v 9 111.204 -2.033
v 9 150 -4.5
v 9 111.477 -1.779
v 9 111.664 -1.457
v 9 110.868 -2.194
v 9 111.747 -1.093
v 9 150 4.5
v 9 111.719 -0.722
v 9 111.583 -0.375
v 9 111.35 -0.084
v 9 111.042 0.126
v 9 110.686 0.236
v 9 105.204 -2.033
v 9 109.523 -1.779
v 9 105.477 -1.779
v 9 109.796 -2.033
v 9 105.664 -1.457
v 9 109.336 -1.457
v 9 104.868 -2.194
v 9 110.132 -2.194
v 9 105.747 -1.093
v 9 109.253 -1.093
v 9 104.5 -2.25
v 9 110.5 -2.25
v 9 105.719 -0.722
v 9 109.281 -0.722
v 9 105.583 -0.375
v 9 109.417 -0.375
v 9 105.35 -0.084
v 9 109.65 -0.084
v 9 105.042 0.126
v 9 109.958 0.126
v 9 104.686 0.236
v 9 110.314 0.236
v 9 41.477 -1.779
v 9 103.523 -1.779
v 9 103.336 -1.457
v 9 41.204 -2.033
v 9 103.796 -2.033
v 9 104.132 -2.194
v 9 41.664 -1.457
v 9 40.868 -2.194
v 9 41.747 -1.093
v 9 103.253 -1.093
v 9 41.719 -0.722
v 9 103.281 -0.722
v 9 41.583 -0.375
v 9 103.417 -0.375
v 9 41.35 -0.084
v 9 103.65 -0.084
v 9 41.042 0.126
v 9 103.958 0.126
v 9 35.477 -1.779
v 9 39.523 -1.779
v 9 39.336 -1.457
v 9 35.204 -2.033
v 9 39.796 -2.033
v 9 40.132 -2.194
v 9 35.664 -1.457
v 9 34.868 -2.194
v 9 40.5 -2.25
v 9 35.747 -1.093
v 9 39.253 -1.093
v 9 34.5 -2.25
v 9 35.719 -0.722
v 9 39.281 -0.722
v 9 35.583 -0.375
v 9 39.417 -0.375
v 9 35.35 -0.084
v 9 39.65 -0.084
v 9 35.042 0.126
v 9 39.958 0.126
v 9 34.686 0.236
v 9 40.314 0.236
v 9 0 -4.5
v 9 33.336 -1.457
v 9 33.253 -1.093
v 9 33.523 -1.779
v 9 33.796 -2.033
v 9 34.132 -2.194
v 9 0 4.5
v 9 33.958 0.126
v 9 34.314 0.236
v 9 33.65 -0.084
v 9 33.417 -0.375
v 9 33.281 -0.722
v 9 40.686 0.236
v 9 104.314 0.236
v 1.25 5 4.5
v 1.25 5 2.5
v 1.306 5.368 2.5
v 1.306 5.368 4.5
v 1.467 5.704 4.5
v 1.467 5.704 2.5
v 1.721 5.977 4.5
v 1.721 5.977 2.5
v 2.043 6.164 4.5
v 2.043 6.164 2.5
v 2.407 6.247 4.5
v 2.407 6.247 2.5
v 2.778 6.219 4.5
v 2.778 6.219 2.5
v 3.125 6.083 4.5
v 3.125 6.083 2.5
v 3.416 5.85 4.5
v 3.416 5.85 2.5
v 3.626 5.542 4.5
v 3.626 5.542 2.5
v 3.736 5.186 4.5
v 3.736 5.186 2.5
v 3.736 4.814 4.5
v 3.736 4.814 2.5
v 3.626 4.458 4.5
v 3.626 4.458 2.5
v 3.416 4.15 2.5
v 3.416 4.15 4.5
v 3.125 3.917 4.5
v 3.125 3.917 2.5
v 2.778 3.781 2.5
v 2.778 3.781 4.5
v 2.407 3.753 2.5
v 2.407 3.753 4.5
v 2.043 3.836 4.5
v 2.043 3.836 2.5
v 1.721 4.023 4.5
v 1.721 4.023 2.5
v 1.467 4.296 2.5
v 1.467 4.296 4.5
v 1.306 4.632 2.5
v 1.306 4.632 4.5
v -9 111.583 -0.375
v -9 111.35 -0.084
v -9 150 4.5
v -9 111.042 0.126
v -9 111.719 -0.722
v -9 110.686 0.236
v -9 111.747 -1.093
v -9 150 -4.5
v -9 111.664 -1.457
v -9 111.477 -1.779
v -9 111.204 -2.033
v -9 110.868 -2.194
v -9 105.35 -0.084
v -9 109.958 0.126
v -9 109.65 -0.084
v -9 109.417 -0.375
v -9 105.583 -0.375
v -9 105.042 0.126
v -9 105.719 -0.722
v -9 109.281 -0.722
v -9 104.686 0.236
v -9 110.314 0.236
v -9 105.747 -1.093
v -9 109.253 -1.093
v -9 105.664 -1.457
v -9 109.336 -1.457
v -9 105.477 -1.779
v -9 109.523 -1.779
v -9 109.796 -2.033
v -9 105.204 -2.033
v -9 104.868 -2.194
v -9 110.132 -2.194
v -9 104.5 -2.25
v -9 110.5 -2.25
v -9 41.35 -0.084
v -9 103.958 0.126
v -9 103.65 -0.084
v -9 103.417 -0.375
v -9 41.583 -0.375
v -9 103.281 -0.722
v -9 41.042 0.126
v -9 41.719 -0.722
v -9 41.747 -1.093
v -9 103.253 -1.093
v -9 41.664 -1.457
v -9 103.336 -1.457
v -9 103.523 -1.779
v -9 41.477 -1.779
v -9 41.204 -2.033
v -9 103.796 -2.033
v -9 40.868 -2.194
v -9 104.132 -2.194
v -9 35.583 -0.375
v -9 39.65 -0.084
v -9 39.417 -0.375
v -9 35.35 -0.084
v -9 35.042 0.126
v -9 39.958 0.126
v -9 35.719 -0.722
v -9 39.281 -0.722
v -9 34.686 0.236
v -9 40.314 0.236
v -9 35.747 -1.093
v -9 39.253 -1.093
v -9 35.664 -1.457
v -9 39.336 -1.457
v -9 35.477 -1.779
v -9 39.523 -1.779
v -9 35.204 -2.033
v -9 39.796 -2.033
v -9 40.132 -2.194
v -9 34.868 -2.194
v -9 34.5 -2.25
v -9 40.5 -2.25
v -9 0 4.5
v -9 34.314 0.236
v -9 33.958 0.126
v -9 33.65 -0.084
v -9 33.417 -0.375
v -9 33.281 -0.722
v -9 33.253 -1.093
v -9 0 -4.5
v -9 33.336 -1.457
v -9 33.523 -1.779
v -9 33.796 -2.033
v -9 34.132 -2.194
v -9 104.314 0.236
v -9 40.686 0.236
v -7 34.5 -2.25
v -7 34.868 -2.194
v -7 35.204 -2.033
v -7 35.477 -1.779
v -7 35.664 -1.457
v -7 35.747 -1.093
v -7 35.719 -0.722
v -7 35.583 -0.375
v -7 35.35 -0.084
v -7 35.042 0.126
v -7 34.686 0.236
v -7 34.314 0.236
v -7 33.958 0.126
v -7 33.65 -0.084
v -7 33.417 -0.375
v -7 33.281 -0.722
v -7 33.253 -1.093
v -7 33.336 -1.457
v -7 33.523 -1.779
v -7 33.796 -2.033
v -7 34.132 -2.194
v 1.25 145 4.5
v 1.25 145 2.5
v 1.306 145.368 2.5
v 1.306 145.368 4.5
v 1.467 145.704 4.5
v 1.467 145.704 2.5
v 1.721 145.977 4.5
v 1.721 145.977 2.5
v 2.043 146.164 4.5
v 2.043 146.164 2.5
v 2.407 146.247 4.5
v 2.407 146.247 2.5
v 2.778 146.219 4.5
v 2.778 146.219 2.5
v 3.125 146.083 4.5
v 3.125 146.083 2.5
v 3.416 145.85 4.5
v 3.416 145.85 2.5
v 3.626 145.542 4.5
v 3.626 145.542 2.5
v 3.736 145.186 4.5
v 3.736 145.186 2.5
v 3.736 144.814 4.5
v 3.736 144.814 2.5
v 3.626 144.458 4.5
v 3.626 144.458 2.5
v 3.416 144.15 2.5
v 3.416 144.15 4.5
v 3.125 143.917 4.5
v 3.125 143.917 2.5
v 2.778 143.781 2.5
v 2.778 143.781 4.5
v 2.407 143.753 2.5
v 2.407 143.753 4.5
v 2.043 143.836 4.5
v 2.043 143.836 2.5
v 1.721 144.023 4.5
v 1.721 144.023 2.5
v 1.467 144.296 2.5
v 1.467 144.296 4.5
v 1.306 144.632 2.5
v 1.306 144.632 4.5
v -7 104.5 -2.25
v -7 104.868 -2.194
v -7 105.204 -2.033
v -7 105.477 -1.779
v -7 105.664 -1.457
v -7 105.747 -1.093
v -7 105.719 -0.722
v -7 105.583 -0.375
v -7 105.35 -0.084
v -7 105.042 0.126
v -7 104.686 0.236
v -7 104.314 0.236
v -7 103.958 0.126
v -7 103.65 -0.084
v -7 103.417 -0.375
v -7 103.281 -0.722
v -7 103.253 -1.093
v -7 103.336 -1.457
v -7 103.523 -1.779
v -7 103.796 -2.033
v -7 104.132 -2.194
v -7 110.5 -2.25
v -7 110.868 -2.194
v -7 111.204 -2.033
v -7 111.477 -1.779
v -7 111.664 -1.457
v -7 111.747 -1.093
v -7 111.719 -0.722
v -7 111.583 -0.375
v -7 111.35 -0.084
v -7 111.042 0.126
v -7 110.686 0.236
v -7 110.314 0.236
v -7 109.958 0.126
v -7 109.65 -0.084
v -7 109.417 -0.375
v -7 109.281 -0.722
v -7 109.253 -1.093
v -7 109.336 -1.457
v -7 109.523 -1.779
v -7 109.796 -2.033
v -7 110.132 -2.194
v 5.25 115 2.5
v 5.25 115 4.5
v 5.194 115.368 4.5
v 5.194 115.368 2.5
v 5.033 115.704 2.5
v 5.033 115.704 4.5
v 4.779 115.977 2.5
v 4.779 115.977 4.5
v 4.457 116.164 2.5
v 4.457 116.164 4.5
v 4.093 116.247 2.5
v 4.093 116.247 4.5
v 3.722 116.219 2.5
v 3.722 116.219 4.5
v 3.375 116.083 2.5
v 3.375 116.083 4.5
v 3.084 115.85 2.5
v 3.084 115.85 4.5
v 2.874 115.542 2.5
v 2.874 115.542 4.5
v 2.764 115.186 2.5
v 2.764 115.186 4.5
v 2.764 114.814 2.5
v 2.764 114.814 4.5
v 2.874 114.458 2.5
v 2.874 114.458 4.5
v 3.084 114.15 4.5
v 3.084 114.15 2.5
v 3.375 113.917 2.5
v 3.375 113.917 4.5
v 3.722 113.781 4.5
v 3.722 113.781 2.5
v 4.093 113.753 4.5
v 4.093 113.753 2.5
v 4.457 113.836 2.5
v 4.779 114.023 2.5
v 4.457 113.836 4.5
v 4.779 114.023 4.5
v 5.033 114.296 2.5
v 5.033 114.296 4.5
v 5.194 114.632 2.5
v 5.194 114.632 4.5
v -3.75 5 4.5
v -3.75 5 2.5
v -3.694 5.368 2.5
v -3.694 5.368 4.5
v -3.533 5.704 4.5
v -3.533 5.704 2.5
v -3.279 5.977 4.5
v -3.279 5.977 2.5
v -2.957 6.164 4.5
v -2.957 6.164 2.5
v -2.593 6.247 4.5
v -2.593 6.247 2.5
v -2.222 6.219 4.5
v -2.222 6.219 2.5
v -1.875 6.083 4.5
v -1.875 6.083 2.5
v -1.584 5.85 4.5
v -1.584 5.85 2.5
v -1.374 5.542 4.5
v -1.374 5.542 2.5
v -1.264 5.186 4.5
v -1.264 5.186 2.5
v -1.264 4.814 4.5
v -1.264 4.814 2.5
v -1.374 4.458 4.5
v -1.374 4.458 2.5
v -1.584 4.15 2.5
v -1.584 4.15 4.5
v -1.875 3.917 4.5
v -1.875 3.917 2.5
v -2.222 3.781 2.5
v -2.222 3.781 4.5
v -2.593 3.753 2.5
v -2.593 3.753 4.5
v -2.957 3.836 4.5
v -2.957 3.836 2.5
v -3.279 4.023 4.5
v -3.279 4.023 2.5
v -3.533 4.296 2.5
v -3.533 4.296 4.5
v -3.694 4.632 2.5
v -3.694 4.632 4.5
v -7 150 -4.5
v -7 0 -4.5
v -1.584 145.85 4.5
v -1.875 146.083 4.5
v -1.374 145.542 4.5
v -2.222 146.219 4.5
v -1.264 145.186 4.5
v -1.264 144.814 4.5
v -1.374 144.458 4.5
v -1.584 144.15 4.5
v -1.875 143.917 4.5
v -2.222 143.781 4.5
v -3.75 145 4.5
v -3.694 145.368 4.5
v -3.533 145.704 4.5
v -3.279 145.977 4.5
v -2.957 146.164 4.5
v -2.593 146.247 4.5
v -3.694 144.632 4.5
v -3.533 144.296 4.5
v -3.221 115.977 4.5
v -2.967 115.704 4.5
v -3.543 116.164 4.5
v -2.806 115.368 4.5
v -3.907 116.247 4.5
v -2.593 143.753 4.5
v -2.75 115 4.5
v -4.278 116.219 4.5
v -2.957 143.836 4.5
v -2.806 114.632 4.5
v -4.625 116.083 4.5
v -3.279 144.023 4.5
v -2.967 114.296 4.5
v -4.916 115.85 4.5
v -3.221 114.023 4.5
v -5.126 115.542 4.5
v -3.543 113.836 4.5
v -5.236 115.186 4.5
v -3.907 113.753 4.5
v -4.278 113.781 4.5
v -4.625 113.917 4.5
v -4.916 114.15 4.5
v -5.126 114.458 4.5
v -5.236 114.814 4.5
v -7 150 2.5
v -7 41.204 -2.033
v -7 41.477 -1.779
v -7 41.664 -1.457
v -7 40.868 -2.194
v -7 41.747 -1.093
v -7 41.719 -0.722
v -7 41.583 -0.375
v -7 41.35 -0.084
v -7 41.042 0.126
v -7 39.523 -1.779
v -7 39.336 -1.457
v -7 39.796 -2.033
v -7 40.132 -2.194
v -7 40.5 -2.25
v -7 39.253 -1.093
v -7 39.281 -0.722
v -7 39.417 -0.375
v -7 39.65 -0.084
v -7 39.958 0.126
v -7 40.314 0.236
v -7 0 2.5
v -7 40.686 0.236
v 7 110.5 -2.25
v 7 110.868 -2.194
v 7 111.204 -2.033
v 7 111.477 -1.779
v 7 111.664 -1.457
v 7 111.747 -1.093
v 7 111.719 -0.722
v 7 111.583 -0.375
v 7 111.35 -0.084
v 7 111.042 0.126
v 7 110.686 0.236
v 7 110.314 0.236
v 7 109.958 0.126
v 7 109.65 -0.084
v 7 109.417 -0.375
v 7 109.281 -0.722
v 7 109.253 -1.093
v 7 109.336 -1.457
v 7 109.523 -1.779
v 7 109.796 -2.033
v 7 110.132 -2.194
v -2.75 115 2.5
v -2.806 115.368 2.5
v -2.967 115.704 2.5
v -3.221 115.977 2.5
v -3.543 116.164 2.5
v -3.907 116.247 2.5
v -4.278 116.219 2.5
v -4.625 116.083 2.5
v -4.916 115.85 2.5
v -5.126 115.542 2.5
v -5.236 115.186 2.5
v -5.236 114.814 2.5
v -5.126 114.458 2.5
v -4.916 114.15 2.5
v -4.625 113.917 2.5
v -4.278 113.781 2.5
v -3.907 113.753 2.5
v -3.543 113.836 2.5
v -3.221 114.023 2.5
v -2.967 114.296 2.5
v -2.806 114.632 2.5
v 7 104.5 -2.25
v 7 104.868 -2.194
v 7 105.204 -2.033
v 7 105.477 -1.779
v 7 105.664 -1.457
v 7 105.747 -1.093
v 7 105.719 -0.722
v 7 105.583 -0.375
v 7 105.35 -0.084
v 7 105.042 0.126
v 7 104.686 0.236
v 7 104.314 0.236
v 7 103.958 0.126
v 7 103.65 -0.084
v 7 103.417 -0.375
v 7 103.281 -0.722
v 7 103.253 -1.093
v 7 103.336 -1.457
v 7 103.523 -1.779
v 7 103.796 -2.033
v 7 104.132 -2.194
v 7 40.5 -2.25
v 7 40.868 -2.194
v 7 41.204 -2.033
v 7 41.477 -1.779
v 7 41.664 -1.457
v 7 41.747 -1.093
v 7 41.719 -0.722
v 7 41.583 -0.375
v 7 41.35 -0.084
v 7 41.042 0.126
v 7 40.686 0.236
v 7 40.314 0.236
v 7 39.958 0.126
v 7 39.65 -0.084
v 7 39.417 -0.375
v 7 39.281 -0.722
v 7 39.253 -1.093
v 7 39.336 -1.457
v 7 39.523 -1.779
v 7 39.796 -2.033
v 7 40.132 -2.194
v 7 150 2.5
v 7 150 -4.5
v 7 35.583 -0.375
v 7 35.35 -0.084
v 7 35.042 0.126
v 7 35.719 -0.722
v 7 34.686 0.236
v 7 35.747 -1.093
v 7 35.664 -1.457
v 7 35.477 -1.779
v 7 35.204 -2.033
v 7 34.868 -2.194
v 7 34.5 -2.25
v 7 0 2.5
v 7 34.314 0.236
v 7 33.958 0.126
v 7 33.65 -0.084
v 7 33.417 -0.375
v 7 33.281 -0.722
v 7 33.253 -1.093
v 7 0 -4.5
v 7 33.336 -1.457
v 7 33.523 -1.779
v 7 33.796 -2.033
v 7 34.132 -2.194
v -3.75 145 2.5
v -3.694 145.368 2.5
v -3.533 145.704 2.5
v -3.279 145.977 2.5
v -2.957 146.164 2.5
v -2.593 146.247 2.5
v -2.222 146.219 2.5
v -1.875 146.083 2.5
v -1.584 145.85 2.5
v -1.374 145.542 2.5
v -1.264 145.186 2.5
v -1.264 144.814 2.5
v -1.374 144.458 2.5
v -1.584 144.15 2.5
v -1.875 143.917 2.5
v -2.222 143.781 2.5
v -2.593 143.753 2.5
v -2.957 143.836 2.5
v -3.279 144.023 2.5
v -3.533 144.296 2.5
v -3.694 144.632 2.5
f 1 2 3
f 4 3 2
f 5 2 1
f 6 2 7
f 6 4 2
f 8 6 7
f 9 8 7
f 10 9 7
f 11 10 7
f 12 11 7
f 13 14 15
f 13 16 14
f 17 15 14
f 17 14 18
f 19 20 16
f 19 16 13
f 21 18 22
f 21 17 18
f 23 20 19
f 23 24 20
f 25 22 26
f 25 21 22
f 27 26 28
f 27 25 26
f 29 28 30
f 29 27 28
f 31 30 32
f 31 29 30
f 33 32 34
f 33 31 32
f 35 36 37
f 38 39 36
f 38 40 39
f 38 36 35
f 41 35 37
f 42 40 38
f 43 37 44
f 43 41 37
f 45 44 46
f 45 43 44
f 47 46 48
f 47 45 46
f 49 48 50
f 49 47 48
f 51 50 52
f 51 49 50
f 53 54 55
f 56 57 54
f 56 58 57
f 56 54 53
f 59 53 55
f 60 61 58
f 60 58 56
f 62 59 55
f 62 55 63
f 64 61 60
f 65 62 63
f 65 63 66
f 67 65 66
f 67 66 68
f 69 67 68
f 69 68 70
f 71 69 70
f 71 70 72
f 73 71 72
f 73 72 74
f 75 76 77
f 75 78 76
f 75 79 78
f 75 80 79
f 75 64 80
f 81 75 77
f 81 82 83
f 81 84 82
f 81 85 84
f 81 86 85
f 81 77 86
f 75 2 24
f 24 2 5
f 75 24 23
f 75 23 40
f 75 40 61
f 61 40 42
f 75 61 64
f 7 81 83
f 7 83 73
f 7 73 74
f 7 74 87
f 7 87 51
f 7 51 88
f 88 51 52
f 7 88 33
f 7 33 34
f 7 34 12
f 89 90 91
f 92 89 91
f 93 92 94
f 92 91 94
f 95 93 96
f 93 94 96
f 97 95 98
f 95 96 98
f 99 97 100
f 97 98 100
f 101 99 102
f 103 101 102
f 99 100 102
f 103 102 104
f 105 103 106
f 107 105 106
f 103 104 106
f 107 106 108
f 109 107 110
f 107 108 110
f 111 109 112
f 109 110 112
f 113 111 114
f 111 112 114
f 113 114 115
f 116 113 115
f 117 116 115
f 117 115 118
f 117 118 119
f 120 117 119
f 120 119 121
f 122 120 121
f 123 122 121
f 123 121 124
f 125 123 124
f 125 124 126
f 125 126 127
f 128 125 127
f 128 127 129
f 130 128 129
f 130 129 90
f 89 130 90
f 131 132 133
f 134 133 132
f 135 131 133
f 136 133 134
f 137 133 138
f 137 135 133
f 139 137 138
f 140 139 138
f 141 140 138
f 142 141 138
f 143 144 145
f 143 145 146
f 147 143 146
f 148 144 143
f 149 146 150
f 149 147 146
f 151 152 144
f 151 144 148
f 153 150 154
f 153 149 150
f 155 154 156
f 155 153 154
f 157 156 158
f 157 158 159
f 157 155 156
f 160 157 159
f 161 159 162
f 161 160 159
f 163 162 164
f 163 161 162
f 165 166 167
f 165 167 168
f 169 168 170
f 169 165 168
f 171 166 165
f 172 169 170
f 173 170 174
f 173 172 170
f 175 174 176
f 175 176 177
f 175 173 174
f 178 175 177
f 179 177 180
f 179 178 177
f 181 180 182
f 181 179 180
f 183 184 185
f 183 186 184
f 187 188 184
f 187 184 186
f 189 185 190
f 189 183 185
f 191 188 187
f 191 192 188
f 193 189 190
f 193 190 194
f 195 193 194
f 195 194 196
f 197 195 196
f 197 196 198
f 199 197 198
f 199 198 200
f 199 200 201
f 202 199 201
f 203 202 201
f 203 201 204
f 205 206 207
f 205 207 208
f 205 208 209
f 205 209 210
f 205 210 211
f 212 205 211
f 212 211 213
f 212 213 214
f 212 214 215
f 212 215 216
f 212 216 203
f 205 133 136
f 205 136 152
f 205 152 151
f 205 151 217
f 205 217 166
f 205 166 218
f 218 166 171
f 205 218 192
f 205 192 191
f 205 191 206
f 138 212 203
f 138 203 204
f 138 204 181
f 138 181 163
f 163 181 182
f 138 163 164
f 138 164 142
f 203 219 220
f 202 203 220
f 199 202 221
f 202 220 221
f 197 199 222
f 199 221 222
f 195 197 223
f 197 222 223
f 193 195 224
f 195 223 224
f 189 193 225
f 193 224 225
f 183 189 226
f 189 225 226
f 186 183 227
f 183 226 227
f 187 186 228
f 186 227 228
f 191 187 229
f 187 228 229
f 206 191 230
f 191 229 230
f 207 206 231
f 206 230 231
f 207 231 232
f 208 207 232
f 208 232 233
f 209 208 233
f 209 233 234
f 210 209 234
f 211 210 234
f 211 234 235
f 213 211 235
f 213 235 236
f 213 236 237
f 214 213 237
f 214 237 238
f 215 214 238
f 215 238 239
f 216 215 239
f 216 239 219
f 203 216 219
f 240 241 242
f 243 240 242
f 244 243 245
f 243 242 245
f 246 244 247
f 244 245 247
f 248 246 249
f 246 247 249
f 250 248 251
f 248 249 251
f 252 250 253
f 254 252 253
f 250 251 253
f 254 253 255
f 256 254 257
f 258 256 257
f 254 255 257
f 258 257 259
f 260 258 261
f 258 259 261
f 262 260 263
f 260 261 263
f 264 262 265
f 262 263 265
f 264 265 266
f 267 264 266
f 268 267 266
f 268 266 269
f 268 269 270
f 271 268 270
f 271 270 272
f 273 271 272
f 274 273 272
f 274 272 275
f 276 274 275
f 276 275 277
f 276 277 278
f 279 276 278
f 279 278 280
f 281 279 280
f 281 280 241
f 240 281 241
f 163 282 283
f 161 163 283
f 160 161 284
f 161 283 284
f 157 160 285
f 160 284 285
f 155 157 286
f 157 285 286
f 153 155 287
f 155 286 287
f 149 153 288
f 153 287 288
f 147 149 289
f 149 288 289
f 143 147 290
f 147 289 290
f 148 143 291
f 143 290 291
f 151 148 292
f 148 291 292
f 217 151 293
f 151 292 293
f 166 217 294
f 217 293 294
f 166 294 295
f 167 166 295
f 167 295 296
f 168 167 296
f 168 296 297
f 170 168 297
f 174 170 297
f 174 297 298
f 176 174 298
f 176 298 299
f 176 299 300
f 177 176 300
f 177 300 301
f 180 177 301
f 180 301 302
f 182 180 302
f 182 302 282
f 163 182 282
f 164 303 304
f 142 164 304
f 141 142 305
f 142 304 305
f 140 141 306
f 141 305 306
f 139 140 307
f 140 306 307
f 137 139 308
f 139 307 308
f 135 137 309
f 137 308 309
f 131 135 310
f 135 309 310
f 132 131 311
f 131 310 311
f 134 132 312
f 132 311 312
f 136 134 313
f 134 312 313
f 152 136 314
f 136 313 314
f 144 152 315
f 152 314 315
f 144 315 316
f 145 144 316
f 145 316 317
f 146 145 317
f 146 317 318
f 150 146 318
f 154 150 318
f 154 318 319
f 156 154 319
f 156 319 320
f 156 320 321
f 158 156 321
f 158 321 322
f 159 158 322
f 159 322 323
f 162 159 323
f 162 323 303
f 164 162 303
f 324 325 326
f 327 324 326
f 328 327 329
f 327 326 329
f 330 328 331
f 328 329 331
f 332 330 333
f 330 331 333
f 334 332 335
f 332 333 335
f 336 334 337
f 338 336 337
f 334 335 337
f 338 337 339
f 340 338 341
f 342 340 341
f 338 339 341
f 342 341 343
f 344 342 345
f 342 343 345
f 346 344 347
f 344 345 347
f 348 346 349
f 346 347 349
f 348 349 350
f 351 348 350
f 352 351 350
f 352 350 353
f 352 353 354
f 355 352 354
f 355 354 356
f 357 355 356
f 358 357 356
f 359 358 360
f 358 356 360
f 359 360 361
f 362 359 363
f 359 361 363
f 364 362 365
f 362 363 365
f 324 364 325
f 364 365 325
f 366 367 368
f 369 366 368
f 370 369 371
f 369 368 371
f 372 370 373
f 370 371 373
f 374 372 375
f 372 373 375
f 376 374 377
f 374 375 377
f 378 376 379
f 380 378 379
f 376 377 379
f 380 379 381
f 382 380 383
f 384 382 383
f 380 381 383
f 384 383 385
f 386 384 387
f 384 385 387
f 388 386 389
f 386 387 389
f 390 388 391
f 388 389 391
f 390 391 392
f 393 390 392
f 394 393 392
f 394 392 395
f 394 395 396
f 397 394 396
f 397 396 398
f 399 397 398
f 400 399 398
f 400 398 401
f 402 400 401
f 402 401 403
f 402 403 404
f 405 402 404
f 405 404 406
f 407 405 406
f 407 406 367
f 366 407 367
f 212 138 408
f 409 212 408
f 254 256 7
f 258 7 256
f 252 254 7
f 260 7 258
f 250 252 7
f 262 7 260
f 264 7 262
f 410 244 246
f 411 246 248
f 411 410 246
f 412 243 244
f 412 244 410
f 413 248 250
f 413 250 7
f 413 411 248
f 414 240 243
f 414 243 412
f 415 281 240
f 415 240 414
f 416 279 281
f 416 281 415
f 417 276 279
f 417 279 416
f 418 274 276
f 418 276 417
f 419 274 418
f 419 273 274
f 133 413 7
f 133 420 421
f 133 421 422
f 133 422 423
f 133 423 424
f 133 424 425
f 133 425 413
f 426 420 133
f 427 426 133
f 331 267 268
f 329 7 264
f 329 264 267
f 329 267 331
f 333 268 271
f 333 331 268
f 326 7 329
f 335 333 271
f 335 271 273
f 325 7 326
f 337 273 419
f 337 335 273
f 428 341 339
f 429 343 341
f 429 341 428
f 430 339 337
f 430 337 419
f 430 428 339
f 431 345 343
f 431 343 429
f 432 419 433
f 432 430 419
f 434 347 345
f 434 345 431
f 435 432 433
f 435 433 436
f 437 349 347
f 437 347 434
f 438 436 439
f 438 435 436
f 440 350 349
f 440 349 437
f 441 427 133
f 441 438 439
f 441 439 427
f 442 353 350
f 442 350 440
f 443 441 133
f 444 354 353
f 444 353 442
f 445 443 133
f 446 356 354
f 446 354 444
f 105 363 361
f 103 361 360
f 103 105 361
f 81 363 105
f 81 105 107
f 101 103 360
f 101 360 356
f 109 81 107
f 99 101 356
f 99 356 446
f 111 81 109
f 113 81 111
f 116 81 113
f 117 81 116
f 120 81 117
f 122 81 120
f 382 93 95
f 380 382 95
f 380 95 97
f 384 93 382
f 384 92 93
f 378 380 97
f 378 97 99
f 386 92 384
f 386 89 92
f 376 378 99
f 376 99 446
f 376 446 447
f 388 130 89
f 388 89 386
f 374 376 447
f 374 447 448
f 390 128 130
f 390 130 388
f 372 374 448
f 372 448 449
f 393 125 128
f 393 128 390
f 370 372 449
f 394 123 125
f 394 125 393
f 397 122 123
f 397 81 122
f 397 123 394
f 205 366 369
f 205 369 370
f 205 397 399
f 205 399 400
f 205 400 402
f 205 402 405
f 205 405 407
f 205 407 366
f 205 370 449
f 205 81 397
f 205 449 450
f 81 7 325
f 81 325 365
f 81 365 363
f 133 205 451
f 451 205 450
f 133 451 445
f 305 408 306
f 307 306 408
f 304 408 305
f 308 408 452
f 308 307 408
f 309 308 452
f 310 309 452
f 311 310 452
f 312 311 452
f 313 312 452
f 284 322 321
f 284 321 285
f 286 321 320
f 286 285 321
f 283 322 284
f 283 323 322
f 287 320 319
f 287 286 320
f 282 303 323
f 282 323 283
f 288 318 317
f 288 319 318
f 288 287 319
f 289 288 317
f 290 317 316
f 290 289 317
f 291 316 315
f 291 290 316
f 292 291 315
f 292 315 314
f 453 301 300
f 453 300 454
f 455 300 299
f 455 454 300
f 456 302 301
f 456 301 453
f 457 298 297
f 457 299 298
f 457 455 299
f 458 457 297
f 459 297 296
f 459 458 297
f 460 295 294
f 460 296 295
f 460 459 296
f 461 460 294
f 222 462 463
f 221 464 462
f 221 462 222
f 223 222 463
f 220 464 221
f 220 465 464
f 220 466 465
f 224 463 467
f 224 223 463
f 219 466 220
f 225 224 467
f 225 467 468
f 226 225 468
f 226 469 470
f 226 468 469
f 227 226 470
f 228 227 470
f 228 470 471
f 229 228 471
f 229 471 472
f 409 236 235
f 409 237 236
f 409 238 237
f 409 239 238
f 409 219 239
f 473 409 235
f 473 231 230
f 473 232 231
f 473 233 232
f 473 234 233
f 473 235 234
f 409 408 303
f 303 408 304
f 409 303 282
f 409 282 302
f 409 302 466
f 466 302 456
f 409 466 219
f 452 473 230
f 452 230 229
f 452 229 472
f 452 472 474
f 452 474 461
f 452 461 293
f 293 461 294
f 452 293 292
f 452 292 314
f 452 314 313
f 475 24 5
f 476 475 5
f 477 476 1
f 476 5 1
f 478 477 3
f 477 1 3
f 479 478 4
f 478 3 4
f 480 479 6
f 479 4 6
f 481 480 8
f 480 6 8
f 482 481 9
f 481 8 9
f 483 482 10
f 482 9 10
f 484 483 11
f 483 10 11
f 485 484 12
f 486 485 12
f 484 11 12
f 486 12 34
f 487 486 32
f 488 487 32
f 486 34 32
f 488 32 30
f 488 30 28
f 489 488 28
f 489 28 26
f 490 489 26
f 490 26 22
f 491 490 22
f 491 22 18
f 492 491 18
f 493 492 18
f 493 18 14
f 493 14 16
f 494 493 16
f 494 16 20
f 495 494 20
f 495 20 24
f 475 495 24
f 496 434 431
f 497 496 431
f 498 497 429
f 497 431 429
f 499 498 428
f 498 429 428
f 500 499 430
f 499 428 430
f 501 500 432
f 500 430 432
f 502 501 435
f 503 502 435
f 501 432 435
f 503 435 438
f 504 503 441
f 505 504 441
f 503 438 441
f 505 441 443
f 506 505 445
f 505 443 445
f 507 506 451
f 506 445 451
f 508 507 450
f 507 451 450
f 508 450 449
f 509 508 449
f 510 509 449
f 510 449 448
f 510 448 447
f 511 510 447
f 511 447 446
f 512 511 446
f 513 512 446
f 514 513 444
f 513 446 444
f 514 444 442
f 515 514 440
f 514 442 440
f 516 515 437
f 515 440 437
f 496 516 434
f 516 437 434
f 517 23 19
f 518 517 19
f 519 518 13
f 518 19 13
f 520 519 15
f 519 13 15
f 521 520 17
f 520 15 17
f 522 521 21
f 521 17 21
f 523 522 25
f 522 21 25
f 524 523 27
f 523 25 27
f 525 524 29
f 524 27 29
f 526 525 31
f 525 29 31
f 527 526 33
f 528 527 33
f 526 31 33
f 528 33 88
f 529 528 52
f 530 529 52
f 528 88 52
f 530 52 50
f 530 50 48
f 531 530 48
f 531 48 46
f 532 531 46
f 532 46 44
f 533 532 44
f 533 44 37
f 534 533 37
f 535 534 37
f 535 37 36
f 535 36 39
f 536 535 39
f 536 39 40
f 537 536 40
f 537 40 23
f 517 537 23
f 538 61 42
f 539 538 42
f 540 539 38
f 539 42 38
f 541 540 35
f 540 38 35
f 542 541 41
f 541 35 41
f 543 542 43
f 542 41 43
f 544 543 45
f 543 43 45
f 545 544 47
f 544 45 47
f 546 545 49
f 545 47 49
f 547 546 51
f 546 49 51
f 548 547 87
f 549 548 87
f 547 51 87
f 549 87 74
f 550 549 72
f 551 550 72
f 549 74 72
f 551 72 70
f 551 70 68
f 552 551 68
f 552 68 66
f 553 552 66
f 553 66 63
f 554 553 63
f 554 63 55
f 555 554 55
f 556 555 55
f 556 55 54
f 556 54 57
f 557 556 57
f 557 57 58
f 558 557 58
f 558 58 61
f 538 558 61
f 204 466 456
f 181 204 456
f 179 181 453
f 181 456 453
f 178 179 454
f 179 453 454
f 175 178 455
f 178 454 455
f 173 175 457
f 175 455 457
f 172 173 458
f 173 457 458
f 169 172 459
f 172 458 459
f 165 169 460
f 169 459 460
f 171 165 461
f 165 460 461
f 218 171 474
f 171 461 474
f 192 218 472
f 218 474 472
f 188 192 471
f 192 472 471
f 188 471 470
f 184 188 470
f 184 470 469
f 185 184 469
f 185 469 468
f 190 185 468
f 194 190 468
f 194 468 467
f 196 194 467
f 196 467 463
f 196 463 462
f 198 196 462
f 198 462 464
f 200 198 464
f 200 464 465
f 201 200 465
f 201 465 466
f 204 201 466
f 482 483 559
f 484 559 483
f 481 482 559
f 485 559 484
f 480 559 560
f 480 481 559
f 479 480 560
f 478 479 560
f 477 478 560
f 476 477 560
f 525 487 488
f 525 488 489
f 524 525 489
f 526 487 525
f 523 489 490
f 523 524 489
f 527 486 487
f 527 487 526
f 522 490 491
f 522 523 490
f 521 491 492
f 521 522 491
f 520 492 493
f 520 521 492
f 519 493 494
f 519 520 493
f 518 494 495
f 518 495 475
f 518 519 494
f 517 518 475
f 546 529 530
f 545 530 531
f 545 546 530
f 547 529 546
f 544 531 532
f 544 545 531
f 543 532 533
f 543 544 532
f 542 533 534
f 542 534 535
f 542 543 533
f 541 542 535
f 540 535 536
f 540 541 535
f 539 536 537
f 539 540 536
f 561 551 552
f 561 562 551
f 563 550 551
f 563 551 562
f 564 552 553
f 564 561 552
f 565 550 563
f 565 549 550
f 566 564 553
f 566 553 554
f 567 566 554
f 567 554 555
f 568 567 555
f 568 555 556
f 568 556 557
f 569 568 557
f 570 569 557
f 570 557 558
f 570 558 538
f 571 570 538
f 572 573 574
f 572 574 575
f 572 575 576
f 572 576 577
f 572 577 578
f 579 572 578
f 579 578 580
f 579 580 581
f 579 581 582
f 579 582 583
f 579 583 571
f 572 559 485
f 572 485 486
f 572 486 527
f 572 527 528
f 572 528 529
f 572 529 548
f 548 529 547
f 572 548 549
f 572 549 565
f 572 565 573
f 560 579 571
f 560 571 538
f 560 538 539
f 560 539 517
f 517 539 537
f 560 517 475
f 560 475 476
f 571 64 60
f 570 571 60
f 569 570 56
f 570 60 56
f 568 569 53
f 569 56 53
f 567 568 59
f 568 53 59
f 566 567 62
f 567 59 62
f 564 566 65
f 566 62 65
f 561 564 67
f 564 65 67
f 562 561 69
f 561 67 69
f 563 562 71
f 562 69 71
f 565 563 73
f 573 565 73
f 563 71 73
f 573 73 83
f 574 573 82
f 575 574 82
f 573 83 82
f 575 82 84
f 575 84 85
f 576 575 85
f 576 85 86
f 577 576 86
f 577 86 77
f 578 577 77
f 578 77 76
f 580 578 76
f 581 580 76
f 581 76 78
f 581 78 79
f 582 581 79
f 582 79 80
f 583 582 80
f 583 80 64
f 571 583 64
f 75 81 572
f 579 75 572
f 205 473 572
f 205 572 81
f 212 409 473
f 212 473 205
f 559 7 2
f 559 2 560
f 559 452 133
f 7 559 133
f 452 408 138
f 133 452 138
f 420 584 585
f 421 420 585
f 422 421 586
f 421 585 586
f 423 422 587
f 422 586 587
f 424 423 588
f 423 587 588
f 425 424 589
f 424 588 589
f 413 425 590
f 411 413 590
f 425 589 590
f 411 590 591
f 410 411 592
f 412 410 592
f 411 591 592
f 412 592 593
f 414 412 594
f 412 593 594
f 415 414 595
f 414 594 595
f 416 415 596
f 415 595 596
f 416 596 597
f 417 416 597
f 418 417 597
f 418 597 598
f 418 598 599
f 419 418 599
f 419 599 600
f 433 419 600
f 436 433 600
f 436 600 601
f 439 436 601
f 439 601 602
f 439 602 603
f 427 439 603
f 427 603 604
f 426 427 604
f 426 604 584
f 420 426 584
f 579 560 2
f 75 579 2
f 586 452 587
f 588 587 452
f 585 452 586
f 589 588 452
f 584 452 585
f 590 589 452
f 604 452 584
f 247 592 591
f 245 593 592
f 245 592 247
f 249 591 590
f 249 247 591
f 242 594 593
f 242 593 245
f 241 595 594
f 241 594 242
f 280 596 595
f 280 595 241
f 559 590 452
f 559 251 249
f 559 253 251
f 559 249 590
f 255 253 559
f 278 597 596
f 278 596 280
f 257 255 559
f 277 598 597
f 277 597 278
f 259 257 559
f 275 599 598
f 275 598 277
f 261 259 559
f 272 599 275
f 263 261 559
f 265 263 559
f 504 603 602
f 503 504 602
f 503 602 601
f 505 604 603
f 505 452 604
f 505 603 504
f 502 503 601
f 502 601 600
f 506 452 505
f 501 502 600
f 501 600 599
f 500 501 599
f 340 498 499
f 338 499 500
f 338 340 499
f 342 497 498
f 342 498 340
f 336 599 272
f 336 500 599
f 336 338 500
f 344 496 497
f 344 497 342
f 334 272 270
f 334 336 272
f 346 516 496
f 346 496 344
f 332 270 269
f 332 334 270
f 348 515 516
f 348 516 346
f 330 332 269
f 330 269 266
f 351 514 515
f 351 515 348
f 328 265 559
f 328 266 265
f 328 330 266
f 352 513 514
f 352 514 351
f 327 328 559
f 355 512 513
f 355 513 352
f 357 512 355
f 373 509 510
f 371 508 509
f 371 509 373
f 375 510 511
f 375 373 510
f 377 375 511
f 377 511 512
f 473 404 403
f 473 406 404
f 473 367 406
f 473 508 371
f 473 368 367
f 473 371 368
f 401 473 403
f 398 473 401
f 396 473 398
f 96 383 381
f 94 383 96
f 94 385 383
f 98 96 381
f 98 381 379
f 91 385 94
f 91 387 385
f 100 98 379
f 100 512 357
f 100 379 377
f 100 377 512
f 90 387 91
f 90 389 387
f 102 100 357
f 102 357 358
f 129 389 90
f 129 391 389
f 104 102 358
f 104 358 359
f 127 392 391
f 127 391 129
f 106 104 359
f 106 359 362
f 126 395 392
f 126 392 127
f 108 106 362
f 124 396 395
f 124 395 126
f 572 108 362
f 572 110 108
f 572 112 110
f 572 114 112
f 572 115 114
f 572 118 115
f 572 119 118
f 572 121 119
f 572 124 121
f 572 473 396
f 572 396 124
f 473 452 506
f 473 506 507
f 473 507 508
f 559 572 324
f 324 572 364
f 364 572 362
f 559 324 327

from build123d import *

# Parameters (mm, degrees)
BOSS_EXTRUDE1_DEPTH     = 150
SKETCH2_R               = 1.25
CUT_EXTRUDE1_DEPTH      = 10
SKETCH5_R               = 1.25
CUT_EXTRUDE2_DEPTH      = 1
CUT_EXTRUDE2_DEPTH_BACK = 19
SKETCH7_R               = 1.25
CUT_EXTRUDE3_DEPTH      = 2


with BuildPart() as part:
    # Sketch1 → Boss-Extrude1 (new body)
    with BuildSketch(Plane(origin=(0, 0, 0), x_dir=(1, 0, 0), z_dir=(0, 1, 0))):
        Polygon((-7, 4.5), (-7, -2.5), (7, -2.5), (7, 4.5), (9, 4.5), (9, -4.5), (-9, -4.5), (-9, 4.5), align=None)
    extrude(amount=BOSS_EXTRUDE1_DEPTH)

    # Sketch2 → Cut-Extrude1 (cut)
    with BuildSketch(Plane(origin=(0, 0, 2.5), x_dir=(-1, 0, 0), z_dir=(0, 0, -1))):
        with Locations((-2.5, 5)):
            Circle(SKETCH2_R)
        with Locations((2.5, 5)):
            Circle(SKETCH2_R)
        with Locations((2.5, 145)):
            Circle(SKETCH2_R)
        with Locations((-2.5, 145)):
            Circle(SKETCH2_R)
    extrude(amount=-CUT_EXTRUDE1_DEPTH, mode=Mode.SUBTRACT)

    # Sketch5 → Cut-Extrude2 (cut, two sides)
    with BuildSketch(Plane(origin=(9, 0, 0), x_dir=(0, 0, -1), z_dir=(1, 0, 0))) as cut_extrude2_sk:
        with Locations((1, 110.5)):
            Circle(SKETCH5_R)
        with Locations((1, 104.5)):
            Circle(SKETCH5_R)
        with Locations((1, 40.5)):
            Circle(SKETCH5_R)
        with Locations((1, 34.5)):
            Circle(SKETCH5_R)
    extrude(amount=CUT_EXTRUDE2_DEPTH, mode=Mode.SUBTRACT)
    extrude(cut_extrude2_sk.sketch, amount=-CUT_EXTRUDE2_DEPTH_BACK, mode=Mode.SUBTRACT)

    # Sketch7 → Cut-Extrude3 (cut)
    with BuildSketch(Plane.XY.offset(4.5)):
        with Locations((-4, 115)):
            Circle(SKETCH7_R)
        with Locations((4, 115)):
            Circle(SKETCH7_R)
    extrude(amount=-CUT_EXTRUDE3_DEPTH, mode=Mode.SUBTRACT)


solid = part.part
